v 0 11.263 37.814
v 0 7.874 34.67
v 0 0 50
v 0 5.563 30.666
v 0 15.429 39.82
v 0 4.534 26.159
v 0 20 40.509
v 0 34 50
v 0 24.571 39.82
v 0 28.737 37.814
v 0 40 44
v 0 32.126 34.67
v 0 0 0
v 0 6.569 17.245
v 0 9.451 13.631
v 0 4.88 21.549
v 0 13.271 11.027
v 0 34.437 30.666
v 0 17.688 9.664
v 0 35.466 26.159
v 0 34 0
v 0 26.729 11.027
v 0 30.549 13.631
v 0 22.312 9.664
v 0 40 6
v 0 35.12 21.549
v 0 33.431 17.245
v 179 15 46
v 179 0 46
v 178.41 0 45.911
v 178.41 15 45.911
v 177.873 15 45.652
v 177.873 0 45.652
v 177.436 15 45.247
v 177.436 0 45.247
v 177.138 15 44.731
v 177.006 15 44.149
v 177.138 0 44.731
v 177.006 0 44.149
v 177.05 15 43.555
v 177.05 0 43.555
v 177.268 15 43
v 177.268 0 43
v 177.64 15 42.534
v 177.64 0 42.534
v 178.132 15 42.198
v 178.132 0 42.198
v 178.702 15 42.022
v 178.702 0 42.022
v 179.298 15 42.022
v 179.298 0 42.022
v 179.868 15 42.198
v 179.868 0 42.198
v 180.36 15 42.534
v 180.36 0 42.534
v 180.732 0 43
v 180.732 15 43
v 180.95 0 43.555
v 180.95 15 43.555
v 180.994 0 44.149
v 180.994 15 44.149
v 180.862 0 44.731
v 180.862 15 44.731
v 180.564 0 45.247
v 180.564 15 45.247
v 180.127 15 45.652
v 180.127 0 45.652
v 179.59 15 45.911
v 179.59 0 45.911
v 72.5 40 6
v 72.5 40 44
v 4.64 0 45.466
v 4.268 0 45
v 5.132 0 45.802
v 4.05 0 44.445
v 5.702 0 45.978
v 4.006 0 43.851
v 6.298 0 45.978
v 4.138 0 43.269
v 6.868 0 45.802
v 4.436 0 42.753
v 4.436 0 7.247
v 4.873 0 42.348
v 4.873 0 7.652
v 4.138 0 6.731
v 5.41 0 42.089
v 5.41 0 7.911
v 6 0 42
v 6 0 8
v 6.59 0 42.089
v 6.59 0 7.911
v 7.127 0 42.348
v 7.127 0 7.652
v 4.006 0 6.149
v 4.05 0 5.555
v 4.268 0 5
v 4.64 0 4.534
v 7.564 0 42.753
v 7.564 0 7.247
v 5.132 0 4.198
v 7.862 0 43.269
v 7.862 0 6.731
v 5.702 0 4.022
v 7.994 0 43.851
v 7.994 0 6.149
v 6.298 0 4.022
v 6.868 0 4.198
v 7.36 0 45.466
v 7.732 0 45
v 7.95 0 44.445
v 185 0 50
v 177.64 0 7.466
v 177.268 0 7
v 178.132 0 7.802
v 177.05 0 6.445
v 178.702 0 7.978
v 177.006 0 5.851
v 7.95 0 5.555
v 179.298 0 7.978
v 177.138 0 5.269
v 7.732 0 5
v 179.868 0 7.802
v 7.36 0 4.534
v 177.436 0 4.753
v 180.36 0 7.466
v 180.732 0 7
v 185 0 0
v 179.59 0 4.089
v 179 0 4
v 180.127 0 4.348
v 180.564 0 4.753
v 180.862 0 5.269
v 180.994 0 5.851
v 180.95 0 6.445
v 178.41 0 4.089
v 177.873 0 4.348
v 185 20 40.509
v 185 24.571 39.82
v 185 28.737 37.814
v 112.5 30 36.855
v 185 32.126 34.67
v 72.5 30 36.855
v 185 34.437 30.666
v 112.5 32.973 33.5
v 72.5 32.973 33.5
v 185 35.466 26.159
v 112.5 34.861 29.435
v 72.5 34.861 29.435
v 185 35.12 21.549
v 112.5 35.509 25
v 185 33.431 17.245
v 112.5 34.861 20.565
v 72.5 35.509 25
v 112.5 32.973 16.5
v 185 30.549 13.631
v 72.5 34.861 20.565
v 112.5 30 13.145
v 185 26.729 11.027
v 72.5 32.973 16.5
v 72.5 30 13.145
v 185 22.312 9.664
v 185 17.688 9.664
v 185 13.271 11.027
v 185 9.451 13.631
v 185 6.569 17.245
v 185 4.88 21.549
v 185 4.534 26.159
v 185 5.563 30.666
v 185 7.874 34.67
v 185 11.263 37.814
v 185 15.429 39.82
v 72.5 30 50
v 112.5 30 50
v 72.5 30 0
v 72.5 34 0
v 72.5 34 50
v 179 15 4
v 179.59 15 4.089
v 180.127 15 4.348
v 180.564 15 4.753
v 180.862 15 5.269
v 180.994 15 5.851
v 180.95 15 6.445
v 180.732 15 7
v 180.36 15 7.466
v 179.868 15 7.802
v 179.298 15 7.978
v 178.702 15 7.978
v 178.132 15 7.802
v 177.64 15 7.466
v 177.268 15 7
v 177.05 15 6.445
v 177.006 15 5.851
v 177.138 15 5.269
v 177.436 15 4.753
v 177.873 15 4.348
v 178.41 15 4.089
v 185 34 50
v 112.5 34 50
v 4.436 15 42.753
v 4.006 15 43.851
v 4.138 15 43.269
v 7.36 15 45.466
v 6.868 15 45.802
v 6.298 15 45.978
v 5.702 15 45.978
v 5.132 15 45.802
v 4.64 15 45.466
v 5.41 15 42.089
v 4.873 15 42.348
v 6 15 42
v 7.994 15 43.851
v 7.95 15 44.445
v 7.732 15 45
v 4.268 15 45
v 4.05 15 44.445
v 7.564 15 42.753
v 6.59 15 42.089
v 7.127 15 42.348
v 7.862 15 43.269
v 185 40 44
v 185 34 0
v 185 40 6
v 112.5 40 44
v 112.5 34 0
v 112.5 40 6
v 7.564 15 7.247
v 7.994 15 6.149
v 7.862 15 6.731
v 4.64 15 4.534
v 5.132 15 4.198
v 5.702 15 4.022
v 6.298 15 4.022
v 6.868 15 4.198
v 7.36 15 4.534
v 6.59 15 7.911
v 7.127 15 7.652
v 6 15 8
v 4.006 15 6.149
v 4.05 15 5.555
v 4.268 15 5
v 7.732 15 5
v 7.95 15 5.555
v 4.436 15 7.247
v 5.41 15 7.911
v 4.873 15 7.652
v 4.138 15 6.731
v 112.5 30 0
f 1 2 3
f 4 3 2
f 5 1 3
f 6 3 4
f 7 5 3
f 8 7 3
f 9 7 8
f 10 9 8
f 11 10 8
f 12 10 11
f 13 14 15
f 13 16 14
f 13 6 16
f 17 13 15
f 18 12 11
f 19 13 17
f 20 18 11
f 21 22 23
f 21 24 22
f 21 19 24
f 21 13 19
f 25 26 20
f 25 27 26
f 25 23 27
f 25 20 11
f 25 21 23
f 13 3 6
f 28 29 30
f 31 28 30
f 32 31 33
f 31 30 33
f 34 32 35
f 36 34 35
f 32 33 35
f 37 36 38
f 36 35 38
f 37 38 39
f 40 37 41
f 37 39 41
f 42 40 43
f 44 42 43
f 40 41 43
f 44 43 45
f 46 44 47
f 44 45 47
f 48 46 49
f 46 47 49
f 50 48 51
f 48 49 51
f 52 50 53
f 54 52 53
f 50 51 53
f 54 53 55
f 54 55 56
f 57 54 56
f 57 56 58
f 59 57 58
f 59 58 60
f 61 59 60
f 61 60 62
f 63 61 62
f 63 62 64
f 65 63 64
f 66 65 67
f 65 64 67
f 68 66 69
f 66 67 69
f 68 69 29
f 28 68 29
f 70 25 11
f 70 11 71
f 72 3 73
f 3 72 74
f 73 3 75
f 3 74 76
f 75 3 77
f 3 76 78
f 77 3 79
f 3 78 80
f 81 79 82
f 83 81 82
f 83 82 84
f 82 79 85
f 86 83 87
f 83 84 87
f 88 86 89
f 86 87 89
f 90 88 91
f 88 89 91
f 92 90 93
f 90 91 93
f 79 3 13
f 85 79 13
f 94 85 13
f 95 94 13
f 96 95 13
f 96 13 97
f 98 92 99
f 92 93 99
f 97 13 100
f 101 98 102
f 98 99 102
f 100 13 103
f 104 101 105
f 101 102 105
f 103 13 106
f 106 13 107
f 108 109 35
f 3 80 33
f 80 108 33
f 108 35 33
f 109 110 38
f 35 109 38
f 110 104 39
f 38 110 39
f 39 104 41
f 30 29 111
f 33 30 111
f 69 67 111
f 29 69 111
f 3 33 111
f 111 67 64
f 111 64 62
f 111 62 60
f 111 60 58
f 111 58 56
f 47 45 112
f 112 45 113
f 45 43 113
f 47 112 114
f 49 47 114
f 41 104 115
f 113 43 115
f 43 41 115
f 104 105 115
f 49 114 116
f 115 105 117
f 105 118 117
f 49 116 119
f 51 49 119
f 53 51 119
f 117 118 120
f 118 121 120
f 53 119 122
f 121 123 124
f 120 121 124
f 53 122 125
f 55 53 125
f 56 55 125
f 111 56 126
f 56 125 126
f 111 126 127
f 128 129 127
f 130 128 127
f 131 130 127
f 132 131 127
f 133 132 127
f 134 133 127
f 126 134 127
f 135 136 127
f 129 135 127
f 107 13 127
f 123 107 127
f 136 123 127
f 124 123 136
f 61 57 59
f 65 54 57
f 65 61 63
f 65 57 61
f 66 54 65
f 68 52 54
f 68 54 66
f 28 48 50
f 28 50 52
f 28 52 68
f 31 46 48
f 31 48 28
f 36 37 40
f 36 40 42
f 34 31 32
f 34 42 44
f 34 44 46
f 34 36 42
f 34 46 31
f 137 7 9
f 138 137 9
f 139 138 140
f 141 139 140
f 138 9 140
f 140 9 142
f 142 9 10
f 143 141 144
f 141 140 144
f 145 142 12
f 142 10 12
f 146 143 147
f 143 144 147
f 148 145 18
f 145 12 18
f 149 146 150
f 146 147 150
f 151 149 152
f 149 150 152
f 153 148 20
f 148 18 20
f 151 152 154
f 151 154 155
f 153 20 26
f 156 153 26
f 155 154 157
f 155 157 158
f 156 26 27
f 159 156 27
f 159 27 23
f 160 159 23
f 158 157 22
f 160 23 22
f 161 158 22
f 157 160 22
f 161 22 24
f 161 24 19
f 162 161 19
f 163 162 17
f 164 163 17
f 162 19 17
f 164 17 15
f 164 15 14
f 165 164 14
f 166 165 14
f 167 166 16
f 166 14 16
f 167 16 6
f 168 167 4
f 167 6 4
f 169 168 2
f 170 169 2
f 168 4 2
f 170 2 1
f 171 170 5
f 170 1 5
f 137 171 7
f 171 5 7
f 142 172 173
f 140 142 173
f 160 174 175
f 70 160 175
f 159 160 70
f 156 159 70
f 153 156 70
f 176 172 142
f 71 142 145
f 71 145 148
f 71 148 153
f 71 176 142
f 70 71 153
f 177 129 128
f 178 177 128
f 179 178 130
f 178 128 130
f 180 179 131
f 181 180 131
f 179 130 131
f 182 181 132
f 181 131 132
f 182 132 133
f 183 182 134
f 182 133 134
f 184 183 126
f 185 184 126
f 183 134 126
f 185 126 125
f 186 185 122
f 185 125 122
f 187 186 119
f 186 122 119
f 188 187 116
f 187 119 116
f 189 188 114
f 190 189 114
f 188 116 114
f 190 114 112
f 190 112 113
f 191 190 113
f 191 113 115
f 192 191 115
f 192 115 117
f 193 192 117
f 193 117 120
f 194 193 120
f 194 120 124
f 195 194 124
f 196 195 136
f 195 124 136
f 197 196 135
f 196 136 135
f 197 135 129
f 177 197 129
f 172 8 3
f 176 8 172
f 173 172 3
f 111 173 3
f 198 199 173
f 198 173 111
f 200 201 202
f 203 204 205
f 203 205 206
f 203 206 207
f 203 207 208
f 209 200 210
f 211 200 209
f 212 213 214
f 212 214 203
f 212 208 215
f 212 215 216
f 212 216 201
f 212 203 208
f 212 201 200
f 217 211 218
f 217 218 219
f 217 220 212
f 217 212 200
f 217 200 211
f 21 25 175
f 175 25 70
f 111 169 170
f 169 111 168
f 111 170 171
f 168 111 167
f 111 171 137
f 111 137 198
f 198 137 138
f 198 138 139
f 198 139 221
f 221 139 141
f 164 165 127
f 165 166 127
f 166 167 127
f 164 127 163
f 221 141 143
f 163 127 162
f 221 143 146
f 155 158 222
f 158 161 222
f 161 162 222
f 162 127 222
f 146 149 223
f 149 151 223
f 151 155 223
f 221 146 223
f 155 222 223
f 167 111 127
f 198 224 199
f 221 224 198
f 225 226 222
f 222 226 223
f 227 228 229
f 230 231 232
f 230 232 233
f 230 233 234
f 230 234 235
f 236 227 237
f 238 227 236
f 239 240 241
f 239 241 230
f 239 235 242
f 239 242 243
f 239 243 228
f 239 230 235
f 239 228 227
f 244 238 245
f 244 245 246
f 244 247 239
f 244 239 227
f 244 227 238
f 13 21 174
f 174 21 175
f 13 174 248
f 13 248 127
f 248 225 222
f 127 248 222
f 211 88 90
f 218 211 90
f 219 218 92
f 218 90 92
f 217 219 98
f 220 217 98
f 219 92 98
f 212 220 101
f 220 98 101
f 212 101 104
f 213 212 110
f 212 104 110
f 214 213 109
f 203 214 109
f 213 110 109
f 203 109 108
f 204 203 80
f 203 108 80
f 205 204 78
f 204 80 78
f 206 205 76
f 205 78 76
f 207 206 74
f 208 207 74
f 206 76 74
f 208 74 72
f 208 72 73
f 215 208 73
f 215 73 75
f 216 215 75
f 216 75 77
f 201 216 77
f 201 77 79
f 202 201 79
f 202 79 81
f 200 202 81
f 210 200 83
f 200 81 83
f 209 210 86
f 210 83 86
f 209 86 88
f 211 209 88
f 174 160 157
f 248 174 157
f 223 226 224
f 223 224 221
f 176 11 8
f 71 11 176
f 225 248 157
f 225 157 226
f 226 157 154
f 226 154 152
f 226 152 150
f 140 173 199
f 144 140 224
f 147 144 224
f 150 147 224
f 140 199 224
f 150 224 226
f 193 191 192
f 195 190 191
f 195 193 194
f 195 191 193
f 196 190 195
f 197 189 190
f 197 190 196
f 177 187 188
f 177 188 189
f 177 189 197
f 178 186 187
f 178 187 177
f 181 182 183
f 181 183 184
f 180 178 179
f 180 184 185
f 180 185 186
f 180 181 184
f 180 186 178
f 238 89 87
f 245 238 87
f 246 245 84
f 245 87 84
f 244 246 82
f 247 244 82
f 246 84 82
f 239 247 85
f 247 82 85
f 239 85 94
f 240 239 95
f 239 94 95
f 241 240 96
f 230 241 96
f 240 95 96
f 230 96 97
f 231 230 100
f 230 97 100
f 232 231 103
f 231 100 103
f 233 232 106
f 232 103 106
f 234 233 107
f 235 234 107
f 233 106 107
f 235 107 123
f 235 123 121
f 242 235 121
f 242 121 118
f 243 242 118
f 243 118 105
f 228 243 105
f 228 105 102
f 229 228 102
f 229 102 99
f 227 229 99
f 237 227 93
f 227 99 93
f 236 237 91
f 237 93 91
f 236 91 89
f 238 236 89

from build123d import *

# Parameters (mm, degrees)
ESQUISSE1_W             = 185
ESQUISSE1_H             = 40
BOSS_EXTRU_1_DEPTH      = 50
ESQUISSE2_R             = 15.509184
ENL_V_MAT_EXTRU_1_DEPTH = 185
CHANFREIN1_SIZE         = 6
ESQUISSE3_R             = 2
ENL_V_MAT_EXTRU_2_DEPTH = 15
ESQUISSE4_W             = 40
ESQUISSE4_H             = 10
ENL_V_MAT_EXTRU_3_DEPTH = 50


with BuildPart() as part:
    # Esquisse1 → Boss.-Extru.1 (new body)
    with BuildSketch(Plane.XY):
        with Locations((92.5, 20)):
            Rectangle(ESQUISSE1_W, ESQUISSE1_H)
    extrude(amount=BOSS_EXTRU_1_DEPTH)

    # Esquisse2 → Enlèv. mat.-Extru.1 (cut)
    with BuildSketch(Plane.ZY):
        with Locations((25, 20)):
            Circle(ESQUISSE2_R)
    extrude(amount=-ENL_V_MAT_EXTRU_1_DEPTH, mode=Mode.SUBTRACT)

    # Chanfrein1
    chanfrein1_edges = [part.edges().sort_by_distance(p)[0] for p in [
        (92.5, 40, 50),
        (92.5, 40, 0),
    ]]
    chamfer(chanfrein1_edges, length=CHANFREIN1_SIZE)

    # Esquisse3 → Enlèv. mat.-Extru.2 (cut)
    with BuildSketch(Plane.XZ):
        with Locations(Location((6, 44, 0), (0, 0, 270))):
            Circle(ESQUISSE3_R)
        with Locations(Location((6, 6, 0), (0, 0, 90))):
            Circle(ESQUISSE3_R)
        with Locations(Location((179, 6, 0), (0, 0, 270))):
            Circle(ESQUISSE3_R)
        with Locations(Location((179, 44, 0), (0, 0, 90))):
            Circle(ESQUISSE3_R)
    extrude(amount=-ENL_V_MAT_EXTRU_2_DEPTH, mode=Mode.SUBTRACT)

    # Esquisse4 → Enlèv. mat.-Extru.3 (cut)
    with BuildSketch(Plane.XY.offset(50)):
        with Locations((92.5, 35)):
            Rectangle(ESQUISSE4_W, ESQUISSE4_H)
    extrude(amount=-ENL_V_MAT_EXTRU_3_DEPTH, mode=Mode.SUBTRACT)


solid = part.part
